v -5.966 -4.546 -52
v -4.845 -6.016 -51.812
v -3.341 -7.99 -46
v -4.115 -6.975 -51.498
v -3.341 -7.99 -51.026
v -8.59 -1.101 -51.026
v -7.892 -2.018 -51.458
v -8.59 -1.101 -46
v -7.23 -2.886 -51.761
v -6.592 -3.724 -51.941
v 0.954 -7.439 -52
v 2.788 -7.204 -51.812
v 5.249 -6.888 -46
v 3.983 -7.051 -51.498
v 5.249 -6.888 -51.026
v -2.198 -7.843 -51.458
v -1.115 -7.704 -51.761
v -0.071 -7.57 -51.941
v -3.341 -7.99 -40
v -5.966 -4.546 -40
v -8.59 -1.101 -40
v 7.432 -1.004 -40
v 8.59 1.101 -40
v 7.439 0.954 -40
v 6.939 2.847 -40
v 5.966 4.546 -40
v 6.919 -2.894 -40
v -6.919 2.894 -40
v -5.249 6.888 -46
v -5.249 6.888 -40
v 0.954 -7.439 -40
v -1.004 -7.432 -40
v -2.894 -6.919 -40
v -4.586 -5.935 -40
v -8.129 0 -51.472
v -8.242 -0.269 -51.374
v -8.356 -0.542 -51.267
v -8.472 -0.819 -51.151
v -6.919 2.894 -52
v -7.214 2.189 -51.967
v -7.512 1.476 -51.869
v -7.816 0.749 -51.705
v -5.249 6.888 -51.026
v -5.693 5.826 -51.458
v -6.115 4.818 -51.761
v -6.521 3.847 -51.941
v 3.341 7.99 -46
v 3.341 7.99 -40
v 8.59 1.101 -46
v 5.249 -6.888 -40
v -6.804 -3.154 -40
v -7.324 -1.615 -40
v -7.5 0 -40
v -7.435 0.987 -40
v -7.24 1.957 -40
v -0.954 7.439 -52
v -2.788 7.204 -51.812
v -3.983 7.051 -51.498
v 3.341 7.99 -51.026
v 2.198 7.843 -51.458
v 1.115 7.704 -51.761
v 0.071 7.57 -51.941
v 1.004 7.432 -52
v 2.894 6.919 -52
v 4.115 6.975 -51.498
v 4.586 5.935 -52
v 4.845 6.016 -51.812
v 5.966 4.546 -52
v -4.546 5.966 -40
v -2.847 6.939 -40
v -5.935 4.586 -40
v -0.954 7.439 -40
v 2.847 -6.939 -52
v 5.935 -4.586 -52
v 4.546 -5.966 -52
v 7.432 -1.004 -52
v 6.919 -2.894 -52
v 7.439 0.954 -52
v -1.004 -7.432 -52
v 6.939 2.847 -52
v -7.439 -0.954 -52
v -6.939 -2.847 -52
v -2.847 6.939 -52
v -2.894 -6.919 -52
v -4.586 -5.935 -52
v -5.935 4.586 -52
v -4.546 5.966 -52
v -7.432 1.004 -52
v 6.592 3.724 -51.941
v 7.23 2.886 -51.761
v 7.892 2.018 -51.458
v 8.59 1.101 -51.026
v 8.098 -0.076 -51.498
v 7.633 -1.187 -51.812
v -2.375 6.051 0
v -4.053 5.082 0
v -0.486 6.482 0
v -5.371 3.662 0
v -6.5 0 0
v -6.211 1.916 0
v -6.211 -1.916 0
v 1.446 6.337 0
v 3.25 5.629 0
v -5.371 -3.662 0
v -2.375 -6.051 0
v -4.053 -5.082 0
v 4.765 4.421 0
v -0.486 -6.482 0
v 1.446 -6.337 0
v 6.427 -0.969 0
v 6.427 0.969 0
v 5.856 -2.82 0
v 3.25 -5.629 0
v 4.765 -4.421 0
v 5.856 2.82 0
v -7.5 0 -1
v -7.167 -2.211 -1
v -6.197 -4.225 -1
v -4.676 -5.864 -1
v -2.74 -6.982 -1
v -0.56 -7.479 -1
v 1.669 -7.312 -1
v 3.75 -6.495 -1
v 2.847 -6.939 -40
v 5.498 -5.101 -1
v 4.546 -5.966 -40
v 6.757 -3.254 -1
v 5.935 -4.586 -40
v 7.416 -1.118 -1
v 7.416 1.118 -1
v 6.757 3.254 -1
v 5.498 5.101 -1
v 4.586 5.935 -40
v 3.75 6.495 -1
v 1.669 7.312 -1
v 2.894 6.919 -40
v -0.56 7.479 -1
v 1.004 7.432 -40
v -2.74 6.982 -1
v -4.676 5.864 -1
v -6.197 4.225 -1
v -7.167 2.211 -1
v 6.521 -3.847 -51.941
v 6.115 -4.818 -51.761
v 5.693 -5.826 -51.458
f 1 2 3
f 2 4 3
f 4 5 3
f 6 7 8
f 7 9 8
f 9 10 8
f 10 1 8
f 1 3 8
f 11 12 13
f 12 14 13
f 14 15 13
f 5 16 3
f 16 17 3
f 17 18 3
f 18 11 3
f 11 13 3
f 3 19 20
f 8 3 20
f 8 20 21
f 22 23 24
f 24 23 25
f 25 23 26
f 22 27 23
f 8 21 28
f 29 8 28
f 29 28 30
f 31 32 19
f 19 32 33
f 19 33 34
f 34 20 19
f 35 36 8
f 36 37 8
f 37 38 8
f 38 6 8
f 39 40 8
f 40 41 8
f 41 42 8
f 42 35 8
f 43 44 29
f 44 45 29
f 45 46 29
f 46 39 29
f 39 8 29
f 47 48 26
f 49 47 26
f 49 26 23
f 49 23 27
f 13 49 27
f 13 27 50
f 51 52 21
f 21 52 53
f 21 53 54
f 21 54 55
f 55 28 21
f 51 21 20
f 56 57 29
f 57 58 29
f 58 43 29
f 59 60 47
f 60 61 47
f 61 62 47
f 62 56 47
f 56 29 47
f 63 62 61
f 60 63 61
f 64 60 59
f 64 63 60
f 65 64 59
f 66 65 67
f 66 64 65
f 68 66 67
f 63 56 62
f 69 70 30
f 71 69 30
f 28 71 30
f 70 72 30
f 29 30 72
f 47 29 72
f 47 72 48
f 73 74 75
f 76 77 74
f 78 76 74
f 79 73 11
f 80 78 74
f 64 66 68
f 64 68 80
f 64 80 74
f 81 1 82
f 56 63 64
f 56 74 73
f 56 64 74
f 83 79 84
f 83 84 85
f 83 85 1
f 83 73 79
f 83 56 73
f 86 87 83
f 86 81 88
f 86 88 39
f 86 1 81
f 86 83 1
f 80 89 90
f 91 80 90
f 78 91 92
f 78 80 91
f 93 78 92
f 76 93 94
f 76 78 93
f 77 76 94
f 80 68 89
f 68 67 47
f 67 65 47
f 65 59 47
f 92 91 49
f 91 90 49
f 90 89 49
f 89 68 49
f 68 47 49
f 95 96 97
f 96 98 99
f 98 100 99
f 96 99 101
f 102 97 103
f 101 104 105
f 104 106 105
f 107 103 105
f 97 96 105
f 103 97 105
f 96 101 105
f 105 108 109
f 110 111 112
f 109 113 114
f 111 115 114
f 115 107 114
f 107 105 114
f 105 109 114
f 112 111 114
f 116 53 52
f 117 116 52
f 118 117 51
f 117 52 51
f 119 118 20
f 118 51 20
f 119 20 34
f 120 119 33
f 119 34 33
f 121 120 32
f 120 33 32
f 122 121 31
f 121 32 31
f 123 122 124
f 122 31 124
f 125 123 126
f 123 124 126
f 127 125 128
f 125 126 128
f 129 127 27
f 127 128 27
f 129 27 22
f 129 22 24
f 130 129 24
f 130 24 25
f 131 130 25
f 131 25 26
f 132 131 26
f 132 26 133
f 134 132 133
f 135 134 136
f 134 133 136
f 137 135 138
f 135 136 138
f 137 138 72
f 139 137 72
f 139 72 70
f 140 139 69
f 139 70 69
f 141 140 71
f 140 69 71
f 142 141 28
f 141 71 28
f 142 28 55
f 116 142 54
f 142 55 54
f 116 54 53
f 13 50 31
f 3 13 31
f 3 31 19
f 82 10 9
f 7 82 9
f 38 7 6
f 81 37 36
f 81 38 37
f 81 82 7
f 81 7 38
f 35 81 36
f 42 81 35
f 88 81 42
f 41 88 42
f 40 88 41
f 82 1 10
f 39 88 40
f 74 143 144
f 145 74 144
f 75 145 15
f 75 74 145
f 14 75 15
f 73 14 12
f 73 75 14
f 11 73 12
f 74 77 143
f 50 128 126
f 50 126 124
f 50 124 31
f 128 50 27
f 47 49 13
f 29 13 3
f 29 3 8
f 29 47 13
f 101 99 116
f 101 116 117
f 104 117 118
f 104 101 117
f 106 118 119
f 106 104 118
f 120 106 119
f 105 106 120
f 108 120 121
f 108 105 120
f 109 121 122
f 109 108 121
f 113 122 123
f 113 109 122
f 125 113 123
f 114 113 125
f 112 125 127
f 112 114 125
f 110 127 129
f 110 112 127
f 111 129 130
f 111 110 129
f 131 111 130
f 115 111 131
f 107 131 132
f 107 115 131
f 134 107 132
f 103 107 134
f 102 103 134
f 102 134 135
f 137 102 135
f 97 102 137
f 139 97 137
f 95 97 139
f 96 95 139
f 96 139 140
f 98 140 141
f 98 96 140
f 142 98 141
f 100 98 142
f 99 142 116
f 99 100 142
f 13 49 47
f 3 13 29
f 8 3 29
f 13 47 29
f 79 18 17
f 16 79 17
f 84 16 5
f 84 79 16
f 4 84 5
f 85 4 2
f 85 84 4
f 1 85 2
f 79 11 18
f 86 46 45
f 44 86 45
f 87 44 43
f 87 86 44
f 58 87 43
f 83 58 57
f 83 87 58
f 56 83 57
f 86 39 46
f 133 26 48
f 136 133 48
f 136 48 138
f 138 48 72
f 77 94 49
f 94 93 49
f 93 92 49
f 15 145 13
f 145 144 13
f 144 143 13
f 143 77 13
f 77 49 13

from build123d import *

# Parameters (mm, degrees)
SKETCH1_W           = 7.5
SKETCH1_H           = 40
BOSS_EXTRUDE1_DEPTH = 6
BOSS_EXTRUDE2_DEPTH = 6
SKETCH4_OUTSIDE_W   = 35.356
SKETCH4_OUTSIDE_H   = 34.156
SKETCH4_OUTSIDE_R   = 7.5
CUT_EXTRUDE1_DEPTH  = 2
CUT_EXTRUDE1_DRAFT  = -50
CHAMFER1_SIZE       = 1


with BuildPart() as part:
    # Sketch1 → Revolve1 (revolve)
    with BuildSketch(Plane(origin=(0, 0, 0), x_dir=(1, 0, 0), z_dir=(0, 1, 0))):
        with Locations((3.75, 20)):
            Rectangle(SKETCH1_W, SKETCH1_H)
    revolve(axis=Axis((0, 0, -40), (0, 0, 1)))

    # Sketch2 → Boss-Extrude1 (add)
    with BuildSketch(Plane(origin=(0, 0, -40), x_dir=(-1, 0, 0), z_dir=(0, 0, -1))):
        Polygon((-3.341179099, 7.989776106), (-8.589938628, 1.101342075), (-5.248759529, -6.888434031), (3.341179099, -7.989776106), (8.589938628, -1.101342075), (5.248759529, 6.888434031), align=None)
    extrude(amount=BOSS_EXTRUDE1_DEPTH)

    # Chamfer1
    chamfer1_edges = [part.edges().sort_by_distance(p)[0] for p in [
        (-7.5, 0, 0),
    ]]
    chamfer(chamfer1_edges, length=CHAMFER1_SIZE)


with BuildPart() as body_2:
    # Sketch3 → Boss-Extrude2 (new body)
    with BuildSketch(Plane(origin=(0, 0, -46), x_dir=(-1, 0, 0), z_dir=(0, 0, -1))):
        Polygon((5.248759529, 6.888434031), (-3.341179099, 7.989776106), (-8.589938628, 1.101342075), (-5.248759529, -6.888434031), (3.341179099, -7.989776106), (8.589938628, -1.101342075), align=None)
    extrude(amount=BOSS_EXTRUDE2_DEPTH)


with BuildPart() as cut_extrude1_tool:
    # Sketch4 outside → Cut-Extrude1 (with draft: the straight prism first)
    with BuildSketch(Plane(origin=(0, 0, -52), x_dir=(-1, 0, 0), z_dir=(0, 0, -1))):
        Rectangle(SKETCH4_OUTSIDE_W, SKETCH4_OUTSIDE_H)
        Circle(SKETCH4_OUTSIDE_R, mode=Mode.SUBTRACT)
    extrude(amount=-CUT_EXTRUDE1_DEPTH)
    # Cut-Extrude1: the draft: its side faces are tilted about the plane it starts from
    cut_extrude1_sides = [cut_extrude1_tool.faces().sort_by_distance(p)[0] for p in [
        (0, -17.078, -51),
        (-17.678, 0, -51),
        (0, 17.078, -51),
        (17.678, 0, -51),
        (7.5, 0, -51),
    ]]
    draft(cut_extrude1_sides, Plane(origin=(0, 0, -52), x_dir=(-1, 0, 0), z_dir=(0, 0, -1)), CUT_EXTRUDE1_DRAFT)


with BuildPart() as body_2_1:
    add(body_2.part)

    # Cut-Extrude1: cut by cut_extrude1_tool
    add(cut_extrude1_tool.part, mode=Mode.SUBTRACT)


solid = Compound([part.part, body_2_1.part])
